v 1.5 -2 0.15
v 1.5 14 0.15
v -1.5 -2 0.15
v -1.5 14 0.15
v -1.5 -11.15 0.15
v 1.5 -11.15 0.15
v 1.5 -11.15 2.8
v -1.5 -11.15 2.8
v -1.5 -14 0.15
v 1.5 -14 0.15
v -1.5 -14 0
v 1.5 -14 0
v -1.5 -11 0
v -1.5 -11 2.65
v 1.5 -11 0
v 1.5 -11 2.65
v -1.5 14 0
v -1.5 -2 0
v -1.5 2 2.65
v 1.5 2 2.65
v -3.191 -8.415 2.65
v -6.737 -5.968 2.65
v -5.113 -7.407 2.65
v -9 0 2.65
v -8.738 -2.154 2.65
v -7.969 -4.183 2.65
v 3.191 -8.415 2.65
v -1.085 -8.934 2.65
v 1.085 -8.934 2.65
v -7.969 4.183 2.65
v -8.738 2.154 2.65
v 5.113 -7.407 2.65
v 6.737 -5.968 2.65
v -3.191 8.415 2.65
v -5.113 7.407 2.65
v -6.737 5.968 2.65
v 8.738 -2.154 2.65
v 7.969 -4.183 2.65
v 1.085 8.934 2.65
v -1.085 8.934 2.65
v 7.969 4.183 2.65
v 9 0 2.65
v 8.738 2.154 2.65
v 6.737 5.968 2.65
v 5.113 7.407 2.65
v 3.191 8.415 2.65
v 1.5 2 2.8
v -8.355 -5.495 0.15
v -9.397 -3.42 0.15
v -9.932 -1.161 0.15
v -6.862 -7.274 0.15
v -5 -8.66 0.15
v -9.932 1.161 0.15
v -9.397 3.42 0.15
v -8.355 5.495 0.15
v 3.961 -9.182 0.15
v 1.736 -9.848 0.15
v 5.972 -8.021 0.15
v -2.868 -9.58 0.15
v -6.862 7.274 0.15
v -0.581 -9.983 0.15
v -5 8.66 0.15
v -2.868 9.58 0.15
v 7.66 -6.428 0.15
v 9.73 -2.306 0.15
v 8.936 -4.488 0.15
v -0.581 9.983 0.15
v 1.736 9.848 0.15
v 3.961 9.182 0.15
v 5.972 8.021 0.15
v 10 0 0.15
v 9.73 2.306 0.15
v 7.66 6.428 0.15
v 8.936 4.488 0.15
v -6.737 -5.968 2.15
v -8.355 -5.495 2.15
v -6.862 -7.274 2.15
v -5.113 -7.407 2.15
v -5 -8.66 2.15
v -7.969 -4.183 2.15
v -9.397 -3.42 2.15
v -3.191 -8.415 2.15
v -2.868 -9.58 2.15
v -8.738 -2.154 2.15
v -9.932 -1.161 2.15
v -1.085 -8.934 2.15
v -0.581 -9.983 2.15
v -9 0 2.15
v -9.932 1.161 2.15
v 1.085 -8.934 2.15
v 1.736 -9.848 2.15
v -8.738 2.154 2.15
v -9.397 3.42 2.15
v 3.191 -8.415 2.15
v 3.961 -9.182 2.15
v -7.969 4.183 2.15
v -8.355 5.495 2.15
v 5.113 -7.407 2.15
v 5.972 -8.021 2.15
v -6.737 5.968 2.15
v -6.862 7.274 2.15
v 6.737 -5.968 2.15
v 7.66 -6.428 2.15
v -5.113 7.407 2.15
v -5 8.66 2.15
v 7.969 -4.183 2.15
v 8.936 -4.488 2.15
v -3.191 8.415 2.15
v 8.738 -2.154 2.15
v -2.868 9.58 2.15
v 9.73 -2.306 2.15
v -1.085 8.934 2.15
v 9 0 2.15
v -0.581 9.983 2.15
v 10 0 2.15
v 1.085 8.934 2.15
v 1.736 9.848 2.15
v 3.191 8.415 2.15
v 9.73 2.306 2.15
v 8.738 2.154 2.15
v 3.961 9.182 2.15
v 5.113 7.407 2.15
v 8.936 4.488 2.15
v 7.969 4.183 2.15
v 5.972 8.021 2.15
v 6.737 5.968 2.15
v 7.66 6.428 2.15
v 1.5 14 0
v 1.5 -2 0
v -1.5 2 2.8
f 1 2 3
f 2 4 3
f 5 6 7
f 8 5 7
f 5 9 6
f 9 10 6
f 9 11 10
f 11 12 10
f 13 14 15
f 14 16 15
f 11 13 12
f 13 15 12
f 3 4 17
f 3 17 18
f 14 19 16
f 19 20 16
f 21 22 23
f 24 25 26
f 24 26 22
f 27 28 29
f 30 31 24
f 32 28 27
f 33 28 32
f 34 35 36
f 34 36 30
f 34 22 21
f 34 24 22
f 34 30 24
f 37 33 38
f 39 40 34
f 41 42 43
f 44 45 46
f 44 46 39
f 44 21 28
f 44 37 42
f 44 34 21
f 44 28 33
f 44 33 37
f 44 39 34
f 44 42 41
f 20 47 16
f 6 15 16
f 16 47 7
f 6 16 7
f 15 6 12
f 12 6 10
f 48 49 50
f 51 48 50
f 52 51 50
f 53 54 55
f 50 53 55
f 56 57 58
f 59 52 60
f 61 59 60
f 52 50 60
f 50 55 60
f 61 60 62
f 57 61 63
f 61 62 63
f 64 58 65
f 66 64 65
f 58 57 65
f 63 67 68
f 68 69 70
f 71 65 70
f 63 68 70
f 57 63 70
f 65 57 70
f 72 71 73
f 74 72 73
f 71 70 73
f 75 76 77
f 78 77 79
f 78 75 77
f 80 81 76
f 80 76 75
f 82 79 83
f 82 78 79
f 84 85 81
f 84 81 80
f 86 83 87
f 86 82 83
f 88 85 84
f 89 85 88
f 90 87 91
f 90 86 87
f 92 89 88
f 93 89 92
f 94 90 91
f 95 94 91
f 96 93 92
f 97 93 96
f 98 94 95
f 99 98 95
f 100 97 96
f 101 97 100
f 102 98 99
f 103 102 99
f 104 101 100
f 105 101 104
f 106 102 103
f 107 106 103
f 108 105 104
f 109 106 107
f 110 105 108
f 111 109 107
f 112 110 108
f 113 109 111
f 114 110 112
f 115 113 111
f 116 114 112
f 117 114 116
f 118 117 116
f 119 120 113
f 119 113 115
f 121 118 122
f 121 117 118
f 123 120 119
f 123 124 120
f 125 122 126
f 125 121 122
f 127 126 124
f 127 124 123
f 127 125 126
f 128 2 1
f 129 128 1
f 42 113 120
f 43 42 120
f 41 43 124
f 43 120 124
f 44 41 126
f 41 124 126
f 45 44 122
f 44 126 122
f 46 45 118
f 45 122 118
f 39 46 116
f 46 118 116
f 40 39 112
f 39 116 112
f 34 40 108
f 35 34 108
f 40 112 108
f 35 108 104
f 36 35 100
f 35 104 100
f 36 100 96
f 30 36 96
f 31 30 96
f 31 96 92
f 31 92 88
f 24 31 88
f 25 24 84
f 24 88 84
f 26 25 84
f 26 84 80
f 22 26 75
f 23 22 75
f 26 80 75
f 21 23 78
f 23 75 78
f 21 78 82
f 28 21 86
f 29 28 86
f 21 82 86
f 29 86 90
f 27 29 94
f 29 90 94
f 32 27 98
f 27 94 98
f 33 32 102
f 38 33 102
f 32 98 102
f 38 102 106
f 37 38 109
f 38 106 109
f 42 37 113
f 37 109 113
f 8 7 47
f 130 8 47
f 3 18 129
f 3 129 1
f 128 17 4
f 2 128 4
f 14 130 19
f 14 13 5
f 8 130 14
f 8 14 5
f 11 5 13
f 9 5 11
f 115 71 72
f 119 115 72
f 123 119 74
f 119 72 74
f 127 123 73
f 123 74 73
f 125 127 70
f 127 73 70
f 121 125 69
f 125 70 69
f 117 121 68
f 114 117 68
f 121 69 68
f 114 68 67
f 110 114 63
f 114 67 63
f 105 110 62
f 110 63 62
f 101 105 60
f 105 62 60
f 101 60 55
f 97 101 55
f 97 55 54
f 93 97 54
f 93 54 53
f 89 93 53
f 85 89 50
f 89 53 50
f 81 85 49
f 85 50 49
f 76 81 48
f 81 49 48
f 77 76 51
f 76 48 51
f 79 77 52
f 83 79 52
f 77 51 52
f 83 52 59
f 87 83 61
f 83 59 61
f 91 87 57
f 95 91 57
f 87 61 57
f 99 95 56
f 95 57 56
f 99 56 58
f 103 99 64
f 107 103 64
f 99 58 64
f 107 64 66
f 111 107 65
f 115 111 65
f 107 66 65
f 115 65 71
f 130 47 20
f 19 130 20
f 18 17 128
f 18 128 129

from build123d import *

# Parameters (mm, degrees)
SKETCH_R                = 10
PAD_DEPTH               = 2
SKETCH001_R             = 9
PAD001_DEPTH            = 0.5
SKETCH003_W             = 16
SKETCH003_H             = 0.15
PAD003_DEPTH            = 1.5
BODY001_PLACEMENT_ANGLE = 180


with BuildPart() as battery:
    # Sketch (on XY_Plane of Origin) → Pad (new body)
    with BuildSketch(Plane.XY.offset(0.15)):
        Circle(SKETCH_R)
    extrude(amount=PAD_DEPTH)

    # Sketch001 (on Face3 of Pad) → Pad001 (join)
    with BuildSketch(Plane.XY.offset(2.15)):
        Circle(SKETCH001_R)
    extrude(amount=PAD001_DEPTH)


with BuildPart() as tabs:
    # Sketch003 (on YZ_Plane of Origin) → Pad003 (new body, symmetric)
    with BuildSketch(Plane.YZ):
        Polygon((-2, 2.8), (-2, 2.65), (11, 2.65), (11, 0), (14, 0), (14, 0.15), (11.15, 0.15), (11.15, 2.8), align=None)
        with Locations((-6, 0.075)):
            Rectangle(SKETCH003_W, SKETCH003_H)
    extrude(amount=PAD003_DEPTH, both=True)


with BuildPart() as tabs_1:
    # Body001 placement: moved
    add(tabs.part.rotate(Axis((0, 0, 0), (0, 0, 1)), BODY001_PLACEMENT_ANGLE))


solid = Compound([battery.part, tabs_1.part])
